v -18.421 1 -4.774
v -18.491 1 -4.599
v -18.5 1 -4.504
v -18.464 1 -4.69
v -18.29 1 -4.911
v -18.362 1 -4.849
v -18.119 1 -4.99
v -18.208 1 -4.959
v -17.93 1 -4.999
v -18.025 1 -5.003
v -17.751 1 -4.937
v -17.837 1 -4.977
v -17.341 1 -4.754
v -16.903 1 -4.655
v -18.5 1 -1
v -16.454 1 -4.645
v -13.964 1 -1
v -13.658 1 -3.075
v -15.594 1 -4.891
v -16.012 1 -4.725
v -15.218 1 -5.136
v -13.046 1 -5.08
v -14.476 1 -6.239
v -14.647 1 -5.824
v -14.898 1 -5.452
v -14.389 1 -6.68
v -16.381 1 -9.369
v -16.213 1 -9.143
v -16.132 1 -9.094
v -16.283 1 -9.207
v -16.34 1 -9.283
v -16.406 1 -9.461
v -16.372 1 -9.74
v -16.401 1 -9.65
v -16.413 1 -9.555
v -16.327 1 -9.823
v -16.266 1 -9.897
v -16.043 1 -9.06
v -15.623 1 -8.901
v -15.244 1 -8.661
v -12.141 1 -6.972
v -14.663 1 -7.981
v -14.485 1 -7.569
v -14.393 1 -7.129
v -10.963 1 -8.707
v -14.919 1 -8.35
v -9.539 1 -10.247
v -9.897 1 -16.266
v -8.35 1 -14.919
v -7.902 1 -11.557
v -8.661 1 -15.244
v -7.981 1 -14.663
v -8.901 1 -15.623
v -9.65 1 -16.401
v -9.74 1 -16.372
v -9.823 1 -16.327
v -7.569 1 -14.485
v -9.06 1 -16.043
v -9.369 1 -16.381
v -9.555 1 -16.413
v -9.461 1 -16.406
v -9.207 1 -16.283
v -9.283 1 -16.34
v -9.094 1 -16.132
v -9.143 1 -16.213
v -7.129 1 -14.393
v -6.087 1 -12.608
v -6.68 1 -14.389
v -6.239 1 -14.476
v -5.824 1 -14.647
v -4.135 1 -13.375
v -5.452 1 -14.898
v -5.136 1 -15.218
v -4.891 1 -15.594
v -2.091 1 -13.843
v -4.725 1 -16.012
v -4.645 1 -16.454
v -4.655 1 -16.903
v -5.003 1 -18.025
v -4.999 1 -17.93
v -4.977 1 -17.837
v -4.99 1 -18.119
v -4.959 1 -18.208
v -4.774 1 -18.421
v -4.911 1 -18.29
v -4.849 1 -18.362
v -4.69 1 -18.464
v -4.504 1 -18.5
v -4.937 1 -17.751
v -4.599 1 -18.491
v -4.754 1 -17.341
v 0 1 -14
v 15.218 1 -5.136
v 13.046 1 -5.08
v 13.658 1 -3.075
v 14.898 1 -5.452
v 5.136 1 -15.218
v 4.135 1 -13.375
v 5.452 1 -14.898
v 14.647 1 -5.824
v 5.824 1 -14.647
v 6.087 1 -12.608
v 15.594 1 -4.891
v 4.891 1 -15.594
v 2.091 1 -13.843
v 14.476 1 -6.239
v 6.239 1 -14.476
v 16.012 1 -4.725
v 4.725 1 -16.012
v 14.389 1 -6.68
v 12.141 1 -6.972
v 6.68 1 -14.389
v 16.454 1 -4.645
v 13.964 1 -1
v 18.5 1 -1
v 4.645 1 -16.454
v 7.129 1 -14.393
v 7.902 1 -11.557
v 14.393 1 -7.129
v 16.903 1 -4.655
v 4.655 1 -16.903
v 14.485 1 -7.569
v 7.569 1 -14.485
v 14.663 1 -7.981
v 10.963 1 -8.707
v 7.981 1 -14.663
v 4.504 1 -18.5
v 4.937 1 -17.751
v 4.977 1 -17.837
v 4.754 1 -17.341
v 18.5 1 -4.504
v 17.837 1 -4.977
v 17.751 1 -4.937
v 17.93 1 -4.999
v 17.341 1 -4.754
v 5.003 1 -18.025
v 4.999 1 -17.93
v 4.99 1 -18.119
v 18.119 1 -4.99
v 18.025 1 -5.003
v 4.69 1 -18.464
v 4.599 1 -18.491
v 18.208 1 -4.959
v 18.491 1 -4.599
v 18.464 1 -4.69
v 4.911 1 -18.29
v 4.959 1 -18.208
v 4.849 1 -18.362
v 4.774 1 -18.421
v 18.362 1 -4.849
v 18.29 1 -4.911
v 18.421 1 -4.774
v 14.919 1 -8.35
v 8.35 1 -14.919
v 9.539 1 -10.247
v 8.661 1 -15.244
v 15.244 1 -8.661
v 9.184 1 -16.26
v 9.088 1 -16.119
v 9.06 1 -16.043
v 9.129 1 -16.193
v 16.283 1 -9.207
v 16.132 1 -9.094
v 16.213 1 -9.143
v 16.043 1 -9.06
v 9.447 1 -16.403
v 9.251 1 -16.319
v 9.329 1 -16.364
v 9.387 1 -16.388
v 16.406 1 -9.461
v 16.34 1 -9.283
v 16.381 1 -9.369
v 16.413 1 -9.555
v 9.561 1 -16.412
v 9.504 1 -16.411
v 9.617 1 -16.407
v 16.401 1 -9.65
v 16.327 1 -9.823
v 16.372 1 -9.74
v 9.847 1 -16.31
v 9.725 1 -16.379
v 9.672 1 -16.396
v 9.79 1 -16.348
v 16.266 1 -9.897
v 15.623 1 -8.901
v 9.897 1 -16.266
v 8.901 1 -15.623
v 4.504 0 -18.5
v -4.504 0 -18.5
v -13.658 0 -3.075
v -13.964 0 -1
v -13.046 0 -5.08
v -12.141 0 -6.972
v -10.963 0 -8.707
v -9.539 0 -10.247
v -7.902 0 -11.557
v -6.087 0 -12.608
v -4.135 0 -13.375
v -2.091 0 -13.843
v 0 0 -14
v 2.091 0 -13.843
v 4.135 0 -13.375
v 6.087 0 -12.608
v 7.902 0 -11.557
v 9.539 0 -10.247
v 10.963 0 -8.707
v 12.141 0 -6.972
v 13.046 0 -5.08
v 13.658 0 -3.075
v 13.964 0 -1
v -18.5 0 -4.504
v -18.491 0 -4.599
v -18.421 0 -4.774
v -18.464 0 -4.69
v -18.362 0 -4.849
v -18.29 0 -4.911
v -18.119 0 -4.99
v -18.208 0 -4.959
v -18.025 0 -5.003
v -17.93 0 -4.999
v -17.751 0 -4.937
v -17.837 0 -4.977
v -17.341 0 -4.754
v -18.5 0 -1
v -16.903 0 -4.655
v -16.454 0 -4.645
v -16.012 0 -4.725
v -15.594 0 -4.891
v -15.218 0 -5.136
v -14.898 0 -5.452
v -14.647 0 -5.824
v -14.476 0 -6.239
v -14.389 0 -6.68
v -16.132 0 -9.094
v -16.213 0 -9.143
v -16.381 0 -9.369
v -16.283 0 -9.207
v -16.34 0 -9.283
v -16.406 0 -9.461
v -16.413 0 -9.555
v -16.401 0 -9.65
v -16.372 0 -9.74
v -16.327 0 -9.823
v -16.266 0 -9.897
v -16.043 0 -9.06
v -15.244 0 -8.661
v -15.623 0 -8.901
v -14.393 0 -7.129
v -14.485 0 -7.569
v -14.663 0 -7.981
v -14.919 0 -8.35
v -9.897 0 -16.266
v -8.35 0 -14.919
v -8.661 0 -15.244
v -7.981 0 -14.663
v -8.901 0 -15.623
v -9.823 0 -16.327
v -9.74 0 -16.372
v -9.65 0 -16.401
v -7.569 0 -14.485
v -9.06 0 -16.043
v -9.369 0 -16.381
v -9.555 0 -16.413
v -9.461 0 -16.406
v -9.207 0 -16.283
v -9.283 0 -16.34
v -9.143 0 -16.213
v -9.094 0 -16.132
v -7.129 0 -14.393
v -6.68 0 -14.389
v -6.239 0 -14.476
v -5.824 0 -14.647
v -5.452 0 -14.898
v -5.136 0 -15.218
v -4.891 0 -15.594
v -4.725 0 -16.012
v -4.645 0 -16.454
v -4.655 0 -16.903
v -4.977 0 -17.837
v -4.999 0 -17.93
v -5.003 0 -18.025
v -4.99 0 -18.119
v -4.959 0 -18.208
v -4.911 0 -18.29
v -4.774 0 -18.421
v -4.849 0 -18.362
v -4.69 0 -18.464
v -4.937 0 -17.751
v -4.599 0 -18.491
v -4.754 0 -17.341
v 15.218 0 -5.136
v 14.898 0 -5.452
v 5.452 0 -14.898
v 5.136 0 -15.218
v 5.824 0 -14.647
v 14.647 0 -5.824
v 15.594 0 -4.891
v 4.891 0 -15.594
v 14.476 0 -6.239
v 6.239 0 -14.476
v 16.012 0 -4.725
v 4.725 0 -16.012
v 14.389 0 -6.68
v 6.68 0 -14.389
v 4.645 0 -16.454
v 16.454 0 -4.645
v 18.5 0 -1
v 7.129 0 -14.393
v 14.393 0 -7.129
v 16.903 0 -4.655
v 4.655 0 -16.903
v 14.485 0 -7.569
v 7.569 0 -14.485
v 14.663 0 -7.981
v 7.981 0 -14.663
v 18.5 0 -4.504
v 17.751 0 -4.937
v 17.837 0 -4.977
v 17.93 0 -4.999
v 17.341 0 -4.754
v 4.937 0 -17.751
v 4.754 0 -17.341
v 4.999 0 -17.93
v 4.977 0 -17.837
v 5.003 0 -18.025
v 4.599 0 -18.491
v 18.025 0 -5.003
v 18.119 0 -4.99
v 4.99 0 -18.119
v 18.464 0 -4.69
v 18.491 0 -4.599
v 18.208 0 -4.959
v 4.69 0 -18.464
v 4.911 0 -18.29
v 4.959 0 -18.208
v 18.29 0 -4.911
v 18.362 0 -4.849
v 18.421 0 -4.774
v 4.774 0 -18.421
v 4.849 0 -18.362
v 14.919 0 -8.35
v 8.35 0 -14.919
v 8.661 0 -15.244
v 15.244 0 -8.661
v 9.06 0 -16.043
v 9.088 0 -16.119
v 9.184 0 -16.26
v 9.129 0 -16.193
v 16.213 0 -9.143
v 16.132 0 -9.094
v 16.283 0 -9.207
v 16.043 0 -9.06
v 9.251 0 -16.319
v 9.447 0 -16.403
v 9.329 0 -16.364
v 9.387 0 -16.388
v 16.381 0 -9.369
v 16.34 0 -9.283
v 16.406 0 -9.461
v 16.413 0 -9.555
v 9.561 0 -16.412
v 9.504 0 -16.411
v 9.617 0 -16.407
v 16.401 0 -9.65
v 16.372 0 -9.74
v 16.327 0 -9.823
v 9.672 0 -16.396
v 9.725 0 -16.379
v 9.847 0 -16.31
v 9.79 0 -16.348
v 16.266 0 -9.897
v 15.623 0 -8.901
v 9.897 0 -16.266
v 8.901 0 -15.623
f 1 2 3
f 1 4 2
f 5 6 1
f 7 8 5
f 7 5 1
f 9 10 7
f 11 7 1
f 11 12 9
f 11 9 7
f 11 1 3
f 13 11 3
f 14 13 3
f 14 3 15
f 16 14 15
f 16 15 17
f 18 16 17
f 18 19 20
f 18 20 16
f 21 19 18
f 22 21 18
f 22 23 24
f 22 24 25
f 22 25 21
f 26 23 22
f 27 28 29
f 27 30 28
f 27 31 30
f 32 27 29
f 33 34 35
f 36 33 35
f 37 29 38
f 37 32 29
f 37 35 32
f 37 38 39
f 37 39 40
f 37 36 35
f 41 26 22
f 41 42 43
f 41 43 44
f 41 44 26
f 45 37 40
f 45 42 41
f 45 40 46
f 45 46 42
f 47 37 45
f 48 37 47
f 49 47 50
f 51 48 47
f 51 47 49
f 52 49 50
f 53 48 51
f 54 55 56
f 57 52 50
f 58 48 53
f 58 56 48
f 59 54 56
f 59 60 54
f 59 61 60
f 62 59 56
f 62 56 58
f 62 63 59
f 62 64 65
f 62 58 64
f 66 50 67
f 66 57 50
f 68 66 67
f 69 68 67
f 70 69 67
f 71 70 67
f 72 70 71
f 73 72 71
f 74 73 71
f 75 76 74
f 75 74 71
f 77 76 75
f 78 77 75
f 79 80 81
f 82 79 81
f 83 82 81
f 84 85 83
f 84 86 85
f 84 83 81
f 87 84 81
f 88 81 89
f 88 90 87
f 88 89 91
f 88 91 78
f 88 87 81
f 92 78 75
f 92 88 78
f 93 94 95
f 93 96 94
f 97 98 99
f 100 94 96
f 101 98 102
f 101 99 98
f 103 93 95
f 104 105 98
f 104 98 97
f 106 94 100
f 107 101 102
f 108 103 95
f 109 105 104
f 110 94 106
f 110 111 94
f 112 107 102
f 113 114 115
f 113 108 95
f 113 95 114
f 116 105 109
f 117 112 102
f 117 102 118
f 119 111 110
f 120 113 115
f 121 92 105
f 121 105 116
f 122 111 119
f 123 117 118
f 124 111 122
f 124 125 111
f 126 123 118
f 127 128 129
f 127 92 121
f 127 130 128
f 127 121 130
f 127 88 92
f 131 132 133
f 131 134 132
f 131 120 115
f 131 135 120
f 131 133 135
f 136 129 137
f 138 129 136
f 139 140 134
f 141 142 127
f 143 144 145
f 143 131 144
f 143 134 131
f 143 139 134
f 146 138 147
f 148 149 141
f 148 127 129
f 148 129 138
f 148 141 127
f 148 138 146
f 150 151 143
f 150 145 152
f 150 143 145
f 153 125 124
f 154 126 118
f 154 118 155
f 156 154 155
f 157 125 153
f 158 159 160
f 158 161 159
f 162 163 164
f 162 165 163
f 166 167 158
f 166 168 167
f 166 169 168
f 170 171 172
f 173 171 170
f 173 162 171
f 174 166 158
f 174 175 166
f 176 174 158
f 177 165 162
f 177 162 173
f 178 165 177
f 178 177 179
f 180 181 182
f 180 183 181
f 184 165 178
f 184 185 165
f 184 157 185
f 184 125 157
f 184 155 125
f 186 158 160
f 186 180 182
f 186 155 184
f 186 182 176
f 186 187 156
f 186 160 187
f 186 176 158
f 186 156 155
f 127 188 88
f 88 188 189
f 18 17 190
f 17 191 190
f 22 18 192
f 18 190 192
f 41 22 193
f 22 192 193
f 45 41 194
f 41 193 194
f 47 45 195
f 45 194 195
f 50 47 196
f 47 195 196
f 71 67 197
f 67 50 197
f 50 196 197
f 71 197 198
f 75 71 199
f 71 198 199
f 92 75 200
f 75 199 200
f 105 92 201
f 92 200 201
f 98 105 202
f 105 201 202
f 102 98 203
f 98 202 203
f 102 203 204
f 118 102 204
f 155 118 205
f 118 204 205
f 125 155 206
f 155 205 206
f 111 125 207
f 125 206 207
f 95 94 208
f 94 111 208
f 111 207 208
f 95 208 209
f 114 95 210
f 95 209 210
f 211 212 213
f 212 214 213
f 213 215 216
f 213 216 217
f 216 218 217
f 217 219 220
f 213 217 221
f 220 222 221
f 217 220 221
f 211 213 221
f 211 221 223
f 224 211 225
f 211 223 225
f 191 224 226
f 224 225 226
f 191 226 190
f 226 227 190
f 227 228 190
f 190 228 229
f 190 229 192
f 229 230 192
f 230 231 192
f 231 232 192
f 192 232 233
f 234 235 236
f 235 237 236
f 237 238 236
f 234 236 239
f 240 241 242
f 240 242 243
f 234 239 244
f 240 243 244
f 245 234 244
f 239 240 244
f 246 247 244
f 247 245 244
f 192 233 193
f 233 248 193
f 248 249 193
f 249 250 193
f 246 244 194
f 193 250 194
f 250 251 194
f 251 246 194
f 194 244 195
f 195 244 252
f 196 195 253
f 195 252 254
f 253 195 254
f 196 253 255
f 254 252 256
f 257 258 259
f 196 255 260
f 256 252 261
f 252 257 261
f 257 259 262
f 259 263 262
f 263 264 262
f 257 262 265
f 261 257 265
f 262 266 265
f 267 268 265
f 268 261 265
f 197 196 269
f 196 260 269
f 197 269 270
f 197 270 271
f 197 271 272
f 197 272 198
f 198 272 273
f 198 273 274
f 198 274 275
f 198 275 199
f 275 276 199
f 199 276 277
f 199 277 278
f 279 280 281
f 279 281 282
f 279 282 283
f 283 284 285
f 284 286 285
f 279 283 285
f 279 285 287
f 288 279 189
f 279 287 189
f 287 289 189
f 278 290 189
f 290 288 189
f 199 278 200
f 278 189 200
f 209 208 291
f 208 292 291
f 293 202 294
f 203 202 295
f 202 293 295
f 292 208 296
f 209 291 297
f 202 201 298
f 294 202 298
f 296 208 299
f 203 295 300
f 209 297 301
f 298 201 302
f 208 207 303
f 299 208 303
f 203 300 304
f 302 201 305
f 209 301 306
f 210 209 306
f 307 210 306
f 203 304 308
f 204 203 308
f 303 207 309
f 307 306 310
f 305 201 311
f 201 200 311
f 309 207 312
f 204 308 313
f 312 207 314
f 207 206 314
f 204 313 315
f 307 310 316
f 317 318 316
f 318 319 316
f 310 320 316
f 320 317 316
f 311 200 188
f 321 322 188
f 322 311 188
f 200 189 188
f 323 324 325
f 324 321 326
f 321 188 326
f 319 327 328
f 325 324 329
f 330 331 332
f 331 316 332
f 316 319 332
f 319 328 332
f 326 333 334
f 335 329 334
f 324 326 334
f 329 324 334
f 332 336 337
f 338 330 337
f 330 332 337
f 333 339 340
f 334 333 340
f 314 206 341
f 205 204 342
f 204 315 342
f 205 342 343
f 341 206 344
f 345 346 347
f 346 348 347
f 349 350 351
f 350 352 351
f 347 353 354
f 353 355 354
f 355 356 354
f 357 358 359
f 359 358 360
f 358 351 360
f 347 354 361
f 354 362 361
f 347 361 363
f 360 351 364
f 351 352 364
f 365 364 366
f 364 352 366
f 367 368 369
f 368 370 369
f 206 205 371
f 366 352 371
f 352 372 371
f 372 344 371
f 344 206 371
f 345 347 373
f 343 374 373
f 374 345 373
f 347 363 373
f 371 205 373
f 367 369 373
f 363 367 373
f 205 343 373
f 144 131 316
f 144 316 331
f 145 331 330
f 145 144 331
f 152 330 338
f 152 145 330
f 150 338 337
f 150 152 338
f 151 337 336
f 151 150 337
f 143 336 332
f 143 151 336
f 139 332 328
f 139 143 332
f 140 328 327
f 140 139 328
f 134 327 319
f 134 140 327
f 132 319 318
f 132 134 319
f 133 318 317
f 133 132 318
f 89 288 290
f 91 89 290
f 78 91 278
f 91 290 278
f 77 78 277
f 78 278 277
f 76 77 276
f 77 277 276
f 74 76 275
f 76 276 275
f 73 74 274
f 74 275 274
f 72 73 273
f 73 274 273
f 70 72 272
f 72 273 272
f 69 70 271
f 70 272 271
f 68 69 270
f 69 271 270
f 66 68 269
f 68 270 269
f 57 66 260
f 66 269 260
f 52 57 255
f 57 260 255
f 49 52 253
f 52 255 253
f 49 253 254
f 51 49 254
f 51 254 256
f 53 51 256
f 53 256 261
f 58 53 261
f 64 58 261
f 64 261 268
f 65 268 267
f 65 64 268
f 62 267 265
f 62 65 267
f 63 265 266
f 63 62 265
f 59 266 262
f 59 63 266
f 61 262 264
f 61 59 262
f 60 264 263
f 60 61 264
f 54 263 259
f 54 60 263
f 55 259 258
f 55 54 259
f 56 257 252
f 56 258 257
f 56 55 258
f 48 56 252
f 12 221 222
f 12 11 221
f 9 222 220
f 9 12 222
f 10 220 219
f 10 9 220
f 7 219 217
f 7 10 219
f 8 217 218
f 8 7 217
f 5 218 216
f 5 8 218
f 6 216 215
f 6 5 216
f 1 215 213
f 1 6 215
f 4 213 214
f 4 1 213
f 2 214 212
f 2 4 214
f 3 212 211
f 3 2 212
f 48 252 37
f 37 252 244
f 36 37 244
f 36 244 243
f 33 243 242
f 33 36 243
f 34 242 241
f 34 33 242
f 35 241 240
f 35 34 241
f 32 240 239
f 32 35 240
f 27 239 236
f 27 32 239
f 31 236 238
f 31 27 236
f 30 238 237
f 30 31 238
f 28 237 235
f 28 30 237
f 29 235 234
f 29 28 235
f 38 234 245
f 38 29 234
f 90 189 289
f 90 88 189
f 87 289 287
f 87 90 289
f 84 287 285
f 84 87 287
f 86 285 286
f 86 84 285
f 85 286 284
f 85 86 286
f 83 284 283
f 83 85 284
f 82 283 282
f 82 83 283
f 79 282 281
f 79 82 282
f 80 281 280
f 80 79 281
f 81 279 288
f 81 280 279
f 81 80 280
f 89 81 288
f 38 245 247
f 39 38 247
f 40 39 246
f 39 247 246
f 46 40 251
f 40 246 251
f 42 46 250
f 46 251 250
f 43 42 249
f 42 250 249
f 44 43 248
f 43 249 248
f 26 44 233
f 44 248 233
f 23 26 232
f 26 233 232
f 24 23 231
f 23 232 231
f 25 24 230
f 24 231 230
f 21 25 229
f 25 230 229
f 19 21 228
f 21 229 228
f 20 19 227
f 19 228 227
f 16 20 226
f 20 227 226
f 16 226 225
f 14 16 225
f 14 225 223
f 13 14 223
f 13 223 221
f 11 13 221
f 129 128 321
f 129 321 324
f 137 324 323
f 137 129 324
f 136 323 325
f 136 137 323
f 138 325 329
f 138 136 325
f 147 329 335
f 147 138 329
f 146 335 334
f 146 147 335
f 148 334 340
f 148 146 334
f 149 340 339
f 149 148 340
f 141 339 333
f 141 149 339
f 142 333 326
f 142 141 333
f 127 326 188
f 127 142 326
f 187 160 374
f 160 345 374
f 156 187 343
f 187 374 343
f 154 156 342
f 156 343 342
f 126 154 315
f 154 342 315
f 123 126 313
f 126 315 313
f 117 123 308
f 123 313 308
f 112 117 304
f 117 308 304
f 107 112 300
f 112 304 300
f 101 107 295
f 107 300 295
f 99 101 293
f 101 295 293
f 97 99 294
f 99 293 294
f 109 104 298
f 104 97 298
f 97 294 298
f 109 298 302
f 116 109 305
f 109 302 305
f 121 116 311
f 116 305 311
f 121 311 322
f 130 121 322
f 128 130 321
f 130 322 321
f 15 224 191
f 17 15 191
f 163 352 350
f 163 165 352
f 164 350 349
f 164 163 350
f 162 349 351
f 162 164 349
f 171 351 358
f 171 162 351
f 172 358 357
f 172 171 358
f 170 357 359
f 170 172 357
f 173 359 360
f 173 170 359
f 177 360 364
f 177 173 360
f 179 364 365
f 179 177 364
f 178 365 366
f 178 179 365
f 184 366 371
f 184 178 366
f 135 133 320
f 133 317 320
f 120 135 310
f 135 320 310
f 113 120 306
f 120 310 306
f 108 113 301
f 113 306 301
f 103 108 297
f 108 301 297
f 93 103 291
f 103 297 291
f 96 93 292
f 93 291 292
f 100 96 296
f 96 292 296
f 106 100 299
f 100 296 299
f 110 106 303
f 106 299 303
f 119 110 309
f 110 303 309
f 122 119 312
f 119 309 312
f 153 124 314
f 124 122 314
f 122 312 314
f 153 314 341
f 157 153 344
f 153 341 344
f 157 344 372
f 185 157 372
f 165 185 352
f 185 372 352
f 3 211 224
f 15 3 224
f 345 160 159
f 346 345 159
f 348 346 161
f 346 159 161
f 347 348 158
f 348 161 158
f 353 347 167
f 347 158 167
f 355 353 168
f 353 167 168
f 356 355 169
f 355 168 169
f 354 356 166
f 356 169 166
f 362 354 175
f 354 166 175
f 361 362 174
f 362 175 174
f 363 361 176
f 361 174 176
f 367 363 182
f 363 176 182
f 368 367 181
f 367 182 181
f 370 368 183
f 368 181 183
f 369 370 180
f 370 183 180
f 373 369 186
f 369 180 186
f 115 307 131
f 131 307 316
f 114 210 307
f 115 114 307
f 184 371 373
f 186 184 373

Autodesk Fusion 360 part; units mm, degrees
sketch "Sketch1" plane through (0, 0, 0) normal (0, 1, 0) x (1, 0, 0)
  circle A0 centre (0, 0) radius 18 construction
  circle A1 centre (0, 0) radius 14
  circle A2 centre (-16.6298, 6.8883) radius 2.25
  circle A3 centre (-16.6298, -6.8883) radius 2.25
  circle A4 centre (-6.8883, -16.6298) radius 2.25
  circle A5 centre (6.8883, -16.6298) radius 2.25
  circle A6 centre (16.6298, -6.8883) radius 2.25
  circle A7 centre (16.6298, 6.8883) radius 2.25
  circle A8 centre (6.8883, 16.6298) radius 2.25
  circle A9 centre (-6.8883, 16.6298) radius 2.25
  line L0 (-18.5, 7.663) -> (-18.5, -7.663)
  line L1 (-18.5, -7.663) -> (-7.663, -18.5)
  line L2 (-7.663, -18.5) -> (7.663, -18.5)
  line L3 (7.663, -18.5) -> (18.5, -7.663)
  line L4 (18.5, -7.663) -> (18.5, 7.663)
  line L5 (18.5, 7.663) -> (7.663, 18.5)
  line L6 (7.663, 18.5) -> (-7.663, 18.5)
  line L7 (-7.663, 18.5) -> (-18.5, 7.663)
  line L8 (-18.5, 1) -> (18.5, 1)
  point P0 (-16.6298, 6.8883)
  dimension "d1" = 36
  dimension "d2" = 28
  dimension "d3" = 4.5
  dimension "d5" = 360
  dimension "d6" = 18.5
  dimension "d7" = 1
extrude "Extrude1" add sketch "Sketch1" along normal blind 1 contours A1 A2 A7 A8 A9 L0 L4 L5 L6 L7 L8
fillet "Fillet1" radius 0.5 8 edges at (18.5, 0.5, -5.6373) (17.0677, 0.5, -9.0953) (9.0953, 0.5, -17.0677) (5.6373, 0.5, -18.5) (-5.6373, 0.5, -18.5) (-9.0953, 0.5, -17.0677) (-17.0677, 0.5, -9.0953) (-18.5, 0.5, -5.6373)
